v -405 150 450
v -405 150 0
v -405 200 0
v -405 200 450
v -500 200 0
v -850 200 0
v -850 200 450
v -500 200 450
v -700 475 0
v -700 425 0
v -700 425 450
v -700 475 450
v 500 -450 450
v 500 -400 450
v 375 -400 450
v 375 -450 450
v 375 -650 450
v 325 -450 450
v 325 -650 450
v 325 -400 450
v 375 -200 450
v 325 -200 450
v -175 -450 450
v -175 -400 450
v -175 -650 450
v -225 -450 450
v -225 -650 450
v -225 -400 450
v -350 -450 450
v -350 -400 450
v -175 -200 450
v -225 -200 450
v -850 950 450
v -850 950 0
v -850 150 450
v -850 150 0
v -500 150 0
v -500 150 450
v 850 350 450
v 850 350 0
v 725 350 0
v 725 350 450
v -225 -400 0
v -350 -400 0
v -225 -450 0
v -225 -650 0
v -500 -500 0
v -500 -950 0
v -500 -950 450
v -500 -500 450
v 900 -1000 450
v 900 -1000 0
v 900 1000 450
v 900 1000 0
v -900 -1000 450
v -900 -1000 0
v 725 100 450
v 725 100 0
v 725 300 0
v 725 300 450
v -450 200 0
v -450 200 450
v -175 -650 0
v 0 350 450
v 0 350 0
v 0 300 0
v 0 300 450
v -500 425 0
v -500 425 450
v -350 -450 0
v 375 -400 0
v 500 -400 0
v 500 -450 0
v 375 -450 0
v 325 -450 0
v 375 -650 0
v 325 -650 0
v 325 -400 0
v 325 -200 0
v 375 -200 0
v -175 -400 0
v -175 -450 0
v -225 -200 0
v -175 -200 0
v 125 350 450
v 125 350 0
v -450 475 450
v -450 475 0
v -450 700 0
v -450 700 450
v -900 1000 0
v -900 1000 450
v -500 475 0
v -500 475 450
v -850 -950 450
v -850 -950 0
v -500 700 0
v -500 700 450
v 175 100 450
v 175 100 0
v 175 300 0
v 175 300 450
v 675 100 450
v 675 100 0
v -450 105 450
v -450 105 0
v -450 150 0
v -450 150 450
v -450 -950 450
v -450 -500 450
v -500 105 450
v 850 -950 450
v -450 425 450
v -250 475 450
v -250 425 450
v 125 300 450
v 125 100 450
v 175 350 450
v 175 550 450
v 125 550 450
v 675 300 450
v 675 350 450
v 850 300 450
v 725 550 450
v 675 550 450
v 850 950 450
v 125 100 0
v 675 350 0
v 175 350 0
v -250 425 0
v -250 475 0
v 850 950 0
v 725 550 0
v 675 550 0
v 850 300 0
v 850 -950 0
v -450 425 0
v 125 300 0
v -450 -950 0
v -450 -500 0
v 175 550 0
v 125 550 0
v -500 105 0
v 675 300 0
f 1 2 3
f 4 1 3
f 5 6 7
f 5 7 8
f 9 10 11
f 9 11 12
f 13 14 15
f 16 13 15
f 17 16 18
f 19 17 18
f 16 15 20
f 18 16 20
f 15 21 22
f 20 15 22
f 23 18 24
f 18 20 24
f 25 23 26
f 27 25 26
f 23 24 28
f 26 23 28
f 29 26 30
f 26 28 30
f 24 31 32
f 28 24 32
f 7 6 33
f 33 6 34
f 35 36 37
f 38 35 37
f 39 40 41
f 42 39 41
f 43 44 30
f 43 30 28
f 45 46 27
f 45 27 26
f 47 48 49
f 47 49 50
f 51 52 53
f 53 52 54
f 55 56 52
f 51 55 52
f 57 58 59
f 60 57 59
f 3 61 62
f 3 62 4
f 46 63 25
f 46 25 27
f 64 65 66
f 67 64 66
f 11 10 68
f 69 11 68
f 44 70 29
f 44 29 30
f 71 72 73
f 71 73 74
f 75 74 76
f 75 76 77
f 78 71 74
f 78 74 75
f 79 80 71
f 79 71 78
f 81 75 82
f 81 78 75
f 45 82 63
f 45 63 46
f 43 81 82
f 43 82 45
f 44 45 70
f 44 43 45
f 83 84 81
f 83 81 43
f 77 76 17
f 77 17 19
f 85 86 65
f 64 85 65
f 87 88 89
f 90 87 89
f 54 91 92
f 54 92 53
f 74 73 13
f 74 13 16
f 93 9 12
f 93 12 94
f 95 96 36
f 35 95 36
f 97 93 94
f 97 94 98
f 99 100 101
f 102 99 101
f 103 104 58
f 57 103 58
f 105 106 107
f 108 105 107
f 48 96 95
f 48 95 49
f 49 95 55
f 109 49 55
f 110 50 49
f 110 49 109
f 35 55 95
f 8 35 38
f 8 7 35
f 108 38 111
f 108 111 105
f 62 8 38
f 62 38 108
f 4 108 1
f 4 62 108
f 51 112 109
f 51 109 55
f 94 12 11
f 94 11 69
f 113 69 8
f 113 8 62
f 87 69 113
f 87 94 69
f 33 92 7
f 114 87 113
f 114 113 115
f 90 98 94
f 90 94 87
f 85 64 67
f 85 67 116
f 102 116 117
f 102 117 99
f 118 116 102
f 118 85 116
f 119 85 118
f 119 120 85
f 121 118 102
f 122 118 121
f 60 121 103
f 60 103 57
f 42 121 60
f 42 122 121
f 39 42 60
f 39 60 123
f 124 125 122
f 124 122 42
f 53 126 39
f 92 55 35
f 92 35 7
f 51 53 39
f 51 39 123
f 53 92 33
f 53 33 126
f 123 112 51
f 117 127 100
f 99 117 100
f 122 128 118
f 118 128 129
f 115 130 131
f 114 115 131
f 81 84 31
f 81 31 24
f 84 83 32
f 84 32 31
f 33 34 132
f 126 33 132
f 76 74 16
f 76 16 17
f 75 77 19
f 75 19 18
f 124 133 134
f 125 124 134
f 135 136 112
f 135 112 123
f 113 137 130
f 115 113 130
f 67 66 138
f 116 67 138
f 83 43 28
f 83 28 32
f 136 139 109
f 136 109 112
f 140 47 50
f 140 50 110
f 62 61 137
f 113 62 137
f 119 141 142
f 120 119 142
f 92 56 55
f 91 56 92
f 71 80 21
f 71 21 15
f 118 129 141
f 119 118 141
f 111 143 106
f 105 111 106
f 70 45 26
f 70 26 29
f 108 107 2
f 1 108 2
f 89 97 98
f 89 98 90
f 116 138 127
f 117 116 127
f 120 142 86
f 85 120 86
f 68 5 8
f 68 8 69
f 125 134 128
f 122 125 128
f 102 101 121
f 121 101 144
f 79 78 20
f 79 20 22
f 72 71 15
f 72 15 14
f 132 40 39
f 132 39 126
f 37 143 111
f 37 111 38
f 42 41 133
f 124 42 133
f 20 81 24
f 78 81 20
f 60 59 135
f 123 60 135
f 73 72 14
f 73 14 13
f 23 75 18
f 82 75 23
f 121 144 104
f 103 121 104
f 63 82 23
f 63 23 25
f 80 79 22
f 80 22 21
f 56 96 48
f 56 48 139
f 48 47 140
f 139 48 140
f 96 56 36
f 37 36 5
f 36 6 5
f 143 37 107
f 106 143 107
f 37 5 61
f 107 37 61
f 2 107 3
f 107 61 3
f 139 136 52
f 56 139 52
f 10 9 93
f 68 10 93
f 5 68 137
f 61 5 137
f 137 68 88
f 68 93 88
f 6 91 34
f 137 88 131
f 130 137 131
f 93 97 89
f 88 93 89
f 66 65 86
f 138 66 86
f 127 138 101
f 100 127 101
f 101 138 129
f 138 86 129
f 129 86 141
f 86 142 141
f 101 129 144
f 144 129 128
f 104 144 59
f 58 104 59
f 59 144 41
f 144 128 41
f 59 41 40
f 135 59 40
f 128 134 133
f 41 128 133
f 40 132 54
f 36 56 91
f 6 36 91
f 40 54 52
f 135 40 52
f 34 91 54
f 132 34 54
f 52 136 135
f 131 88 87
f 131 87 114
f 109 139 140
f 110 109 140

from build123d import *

# Parameters (mm, degrees)
SKETCH1_W           = 180
SKETCH1_H           = 200
SKETCH1_W_2         = 170
SKETCH1_H_2         = 190
SKETCH1_W_3         = 35
SKETCH1_H_3         = 5
SKETCH1_W_4         = 5
SKETCH1_H_4         = 22.5
SKETCH1_W_5         = 20
SKETCH1_H_5         = 4.5
SKETCH1_W_6         = 4.5
SKETCH1_H_6         = 45
BOSS_EXTRUDE1_DEPTH = 45
SCALE1_SCALE        = 10


with BuildPart() as part:
    # Sketch1 → Boss-Extrude1 (new body)
    # profile 1 of 13: a face of its own
    with BuildSketch(Plane.XY):
        Rectangle(SKETCH1_W, SKETCH1_H)
        Rectangle(SKETCH1_W_2, SKETCH1_H_2, mode=Mode.SUBTRACT)
    # profile 2 of 13: a face of its own
    with BuildSketch(Plane.XY):
        with Locations((-67.5, 17.5)):
            Rectangle(SKETCH1_W_3, SKETCH1_H_3)
    # profile 3 of 13: a face of its own
    with BuildSketch(Plane.XY):
        with Locations((-47.5, 31.25)):
            Rectangle(SKETCH1_W_4, SKETCH1_H_4)
    # profile 4 of 13: a face of its own
    with BuildSketch(Plane.XY):
        with Locations((-60, 45)):
            Rectangle(SKETCH1_W_5, SKETCH1_H_3)
    # profile 5 of 13: a face of its own
    with BuildSketch(Plane.XY):
        with Locations((-47.5, 45)):
            Rectangle(SKETCH1_W_4, SKETCH1_H_3)
    # profile 6 of 13: a face of its own
    with BuildSketch(Plane.XY):
        with Locations((-47.5, 58.75)):
            Rectangle(SKETCH1_W_4, SKETCH1_H_4)
    # profile 7 of 13: a face of its own
    with BuildSketch(Plane.XY):
        with Locations((-35, 45)):
            Rectangle(SKETCH1_W_5, SKETCH1_H_3)
    # profile 8 of 13: a face of its own
    with BuildSketch(Plane.XY):
        with Locations((-47.5, 17.5)):
            Rectangle(SKETCH1_W_4, SKETCH1_H_3)
    # profile 9 of 13: a face of its own
    with BuildSketch(Plane.XY):
        with Locations((-47.5, 12.75)):
            Rectangle(SKETCH1_W_4, SKETCH1_H_5)
    # profile 10 of 13: a face of its own
    with BuildSketch(Plane.XY):
        with Locations((-42.75, 17.5)):
            Rectangle(SKETCH1_W_6, SKETCH1_H_3)
    # profile 11 of 13: a face of its own
    with BuildSketch(Plane.XY):
        Polygon((72.5, 30), (85, 30), (85, 35), (72.5, 35), (72.5, 55), (67.5, 55), (67.5, 35), (17.5, 35), (17.5, 55), (12.5, 55), (12.5, 35), (0, 35), (0, 30), (12.5, 30), (12.5, 10), (17.5, 10), (17.5, 30), (67.5, 30), (67.5, 10), (72.5, 10), align=None)
    # profile 12 of 13: a face of its own
    with BuildSketch(Plane.XY):
        with Locations((-47.5, -72.5)):
            Rectangle(SKETCH1_W_4, SKETCH1_H_6)
    # profile 13 of 13: a face of its own
    with BuildSketch(Plane.XY):
        Polygon((32.5, -40), (32.5, -20), (37.5, -20), (37.5, -40), (50, -40), (50, -45), (37.5, -45), (37.5, -65), (32.5, -65), (32.5, -45), (-17.5, -45), (-17.5, -65), (-22.5, -65), (-22.5, -45), (-35, -45), (-35, -40), (-22.5, -40), (-22.5, -20), (-17.5, -20), (-17.5, -40), align=None)
    extrude(amount=BOSS_EXTRUDE1_DEPTH)


with BuildPart() as part_1:
    # Scale1: scaled about (0, 0, 0)
    add(part.part.scale(SCALE1_SCALE))


solid = part_1.part
